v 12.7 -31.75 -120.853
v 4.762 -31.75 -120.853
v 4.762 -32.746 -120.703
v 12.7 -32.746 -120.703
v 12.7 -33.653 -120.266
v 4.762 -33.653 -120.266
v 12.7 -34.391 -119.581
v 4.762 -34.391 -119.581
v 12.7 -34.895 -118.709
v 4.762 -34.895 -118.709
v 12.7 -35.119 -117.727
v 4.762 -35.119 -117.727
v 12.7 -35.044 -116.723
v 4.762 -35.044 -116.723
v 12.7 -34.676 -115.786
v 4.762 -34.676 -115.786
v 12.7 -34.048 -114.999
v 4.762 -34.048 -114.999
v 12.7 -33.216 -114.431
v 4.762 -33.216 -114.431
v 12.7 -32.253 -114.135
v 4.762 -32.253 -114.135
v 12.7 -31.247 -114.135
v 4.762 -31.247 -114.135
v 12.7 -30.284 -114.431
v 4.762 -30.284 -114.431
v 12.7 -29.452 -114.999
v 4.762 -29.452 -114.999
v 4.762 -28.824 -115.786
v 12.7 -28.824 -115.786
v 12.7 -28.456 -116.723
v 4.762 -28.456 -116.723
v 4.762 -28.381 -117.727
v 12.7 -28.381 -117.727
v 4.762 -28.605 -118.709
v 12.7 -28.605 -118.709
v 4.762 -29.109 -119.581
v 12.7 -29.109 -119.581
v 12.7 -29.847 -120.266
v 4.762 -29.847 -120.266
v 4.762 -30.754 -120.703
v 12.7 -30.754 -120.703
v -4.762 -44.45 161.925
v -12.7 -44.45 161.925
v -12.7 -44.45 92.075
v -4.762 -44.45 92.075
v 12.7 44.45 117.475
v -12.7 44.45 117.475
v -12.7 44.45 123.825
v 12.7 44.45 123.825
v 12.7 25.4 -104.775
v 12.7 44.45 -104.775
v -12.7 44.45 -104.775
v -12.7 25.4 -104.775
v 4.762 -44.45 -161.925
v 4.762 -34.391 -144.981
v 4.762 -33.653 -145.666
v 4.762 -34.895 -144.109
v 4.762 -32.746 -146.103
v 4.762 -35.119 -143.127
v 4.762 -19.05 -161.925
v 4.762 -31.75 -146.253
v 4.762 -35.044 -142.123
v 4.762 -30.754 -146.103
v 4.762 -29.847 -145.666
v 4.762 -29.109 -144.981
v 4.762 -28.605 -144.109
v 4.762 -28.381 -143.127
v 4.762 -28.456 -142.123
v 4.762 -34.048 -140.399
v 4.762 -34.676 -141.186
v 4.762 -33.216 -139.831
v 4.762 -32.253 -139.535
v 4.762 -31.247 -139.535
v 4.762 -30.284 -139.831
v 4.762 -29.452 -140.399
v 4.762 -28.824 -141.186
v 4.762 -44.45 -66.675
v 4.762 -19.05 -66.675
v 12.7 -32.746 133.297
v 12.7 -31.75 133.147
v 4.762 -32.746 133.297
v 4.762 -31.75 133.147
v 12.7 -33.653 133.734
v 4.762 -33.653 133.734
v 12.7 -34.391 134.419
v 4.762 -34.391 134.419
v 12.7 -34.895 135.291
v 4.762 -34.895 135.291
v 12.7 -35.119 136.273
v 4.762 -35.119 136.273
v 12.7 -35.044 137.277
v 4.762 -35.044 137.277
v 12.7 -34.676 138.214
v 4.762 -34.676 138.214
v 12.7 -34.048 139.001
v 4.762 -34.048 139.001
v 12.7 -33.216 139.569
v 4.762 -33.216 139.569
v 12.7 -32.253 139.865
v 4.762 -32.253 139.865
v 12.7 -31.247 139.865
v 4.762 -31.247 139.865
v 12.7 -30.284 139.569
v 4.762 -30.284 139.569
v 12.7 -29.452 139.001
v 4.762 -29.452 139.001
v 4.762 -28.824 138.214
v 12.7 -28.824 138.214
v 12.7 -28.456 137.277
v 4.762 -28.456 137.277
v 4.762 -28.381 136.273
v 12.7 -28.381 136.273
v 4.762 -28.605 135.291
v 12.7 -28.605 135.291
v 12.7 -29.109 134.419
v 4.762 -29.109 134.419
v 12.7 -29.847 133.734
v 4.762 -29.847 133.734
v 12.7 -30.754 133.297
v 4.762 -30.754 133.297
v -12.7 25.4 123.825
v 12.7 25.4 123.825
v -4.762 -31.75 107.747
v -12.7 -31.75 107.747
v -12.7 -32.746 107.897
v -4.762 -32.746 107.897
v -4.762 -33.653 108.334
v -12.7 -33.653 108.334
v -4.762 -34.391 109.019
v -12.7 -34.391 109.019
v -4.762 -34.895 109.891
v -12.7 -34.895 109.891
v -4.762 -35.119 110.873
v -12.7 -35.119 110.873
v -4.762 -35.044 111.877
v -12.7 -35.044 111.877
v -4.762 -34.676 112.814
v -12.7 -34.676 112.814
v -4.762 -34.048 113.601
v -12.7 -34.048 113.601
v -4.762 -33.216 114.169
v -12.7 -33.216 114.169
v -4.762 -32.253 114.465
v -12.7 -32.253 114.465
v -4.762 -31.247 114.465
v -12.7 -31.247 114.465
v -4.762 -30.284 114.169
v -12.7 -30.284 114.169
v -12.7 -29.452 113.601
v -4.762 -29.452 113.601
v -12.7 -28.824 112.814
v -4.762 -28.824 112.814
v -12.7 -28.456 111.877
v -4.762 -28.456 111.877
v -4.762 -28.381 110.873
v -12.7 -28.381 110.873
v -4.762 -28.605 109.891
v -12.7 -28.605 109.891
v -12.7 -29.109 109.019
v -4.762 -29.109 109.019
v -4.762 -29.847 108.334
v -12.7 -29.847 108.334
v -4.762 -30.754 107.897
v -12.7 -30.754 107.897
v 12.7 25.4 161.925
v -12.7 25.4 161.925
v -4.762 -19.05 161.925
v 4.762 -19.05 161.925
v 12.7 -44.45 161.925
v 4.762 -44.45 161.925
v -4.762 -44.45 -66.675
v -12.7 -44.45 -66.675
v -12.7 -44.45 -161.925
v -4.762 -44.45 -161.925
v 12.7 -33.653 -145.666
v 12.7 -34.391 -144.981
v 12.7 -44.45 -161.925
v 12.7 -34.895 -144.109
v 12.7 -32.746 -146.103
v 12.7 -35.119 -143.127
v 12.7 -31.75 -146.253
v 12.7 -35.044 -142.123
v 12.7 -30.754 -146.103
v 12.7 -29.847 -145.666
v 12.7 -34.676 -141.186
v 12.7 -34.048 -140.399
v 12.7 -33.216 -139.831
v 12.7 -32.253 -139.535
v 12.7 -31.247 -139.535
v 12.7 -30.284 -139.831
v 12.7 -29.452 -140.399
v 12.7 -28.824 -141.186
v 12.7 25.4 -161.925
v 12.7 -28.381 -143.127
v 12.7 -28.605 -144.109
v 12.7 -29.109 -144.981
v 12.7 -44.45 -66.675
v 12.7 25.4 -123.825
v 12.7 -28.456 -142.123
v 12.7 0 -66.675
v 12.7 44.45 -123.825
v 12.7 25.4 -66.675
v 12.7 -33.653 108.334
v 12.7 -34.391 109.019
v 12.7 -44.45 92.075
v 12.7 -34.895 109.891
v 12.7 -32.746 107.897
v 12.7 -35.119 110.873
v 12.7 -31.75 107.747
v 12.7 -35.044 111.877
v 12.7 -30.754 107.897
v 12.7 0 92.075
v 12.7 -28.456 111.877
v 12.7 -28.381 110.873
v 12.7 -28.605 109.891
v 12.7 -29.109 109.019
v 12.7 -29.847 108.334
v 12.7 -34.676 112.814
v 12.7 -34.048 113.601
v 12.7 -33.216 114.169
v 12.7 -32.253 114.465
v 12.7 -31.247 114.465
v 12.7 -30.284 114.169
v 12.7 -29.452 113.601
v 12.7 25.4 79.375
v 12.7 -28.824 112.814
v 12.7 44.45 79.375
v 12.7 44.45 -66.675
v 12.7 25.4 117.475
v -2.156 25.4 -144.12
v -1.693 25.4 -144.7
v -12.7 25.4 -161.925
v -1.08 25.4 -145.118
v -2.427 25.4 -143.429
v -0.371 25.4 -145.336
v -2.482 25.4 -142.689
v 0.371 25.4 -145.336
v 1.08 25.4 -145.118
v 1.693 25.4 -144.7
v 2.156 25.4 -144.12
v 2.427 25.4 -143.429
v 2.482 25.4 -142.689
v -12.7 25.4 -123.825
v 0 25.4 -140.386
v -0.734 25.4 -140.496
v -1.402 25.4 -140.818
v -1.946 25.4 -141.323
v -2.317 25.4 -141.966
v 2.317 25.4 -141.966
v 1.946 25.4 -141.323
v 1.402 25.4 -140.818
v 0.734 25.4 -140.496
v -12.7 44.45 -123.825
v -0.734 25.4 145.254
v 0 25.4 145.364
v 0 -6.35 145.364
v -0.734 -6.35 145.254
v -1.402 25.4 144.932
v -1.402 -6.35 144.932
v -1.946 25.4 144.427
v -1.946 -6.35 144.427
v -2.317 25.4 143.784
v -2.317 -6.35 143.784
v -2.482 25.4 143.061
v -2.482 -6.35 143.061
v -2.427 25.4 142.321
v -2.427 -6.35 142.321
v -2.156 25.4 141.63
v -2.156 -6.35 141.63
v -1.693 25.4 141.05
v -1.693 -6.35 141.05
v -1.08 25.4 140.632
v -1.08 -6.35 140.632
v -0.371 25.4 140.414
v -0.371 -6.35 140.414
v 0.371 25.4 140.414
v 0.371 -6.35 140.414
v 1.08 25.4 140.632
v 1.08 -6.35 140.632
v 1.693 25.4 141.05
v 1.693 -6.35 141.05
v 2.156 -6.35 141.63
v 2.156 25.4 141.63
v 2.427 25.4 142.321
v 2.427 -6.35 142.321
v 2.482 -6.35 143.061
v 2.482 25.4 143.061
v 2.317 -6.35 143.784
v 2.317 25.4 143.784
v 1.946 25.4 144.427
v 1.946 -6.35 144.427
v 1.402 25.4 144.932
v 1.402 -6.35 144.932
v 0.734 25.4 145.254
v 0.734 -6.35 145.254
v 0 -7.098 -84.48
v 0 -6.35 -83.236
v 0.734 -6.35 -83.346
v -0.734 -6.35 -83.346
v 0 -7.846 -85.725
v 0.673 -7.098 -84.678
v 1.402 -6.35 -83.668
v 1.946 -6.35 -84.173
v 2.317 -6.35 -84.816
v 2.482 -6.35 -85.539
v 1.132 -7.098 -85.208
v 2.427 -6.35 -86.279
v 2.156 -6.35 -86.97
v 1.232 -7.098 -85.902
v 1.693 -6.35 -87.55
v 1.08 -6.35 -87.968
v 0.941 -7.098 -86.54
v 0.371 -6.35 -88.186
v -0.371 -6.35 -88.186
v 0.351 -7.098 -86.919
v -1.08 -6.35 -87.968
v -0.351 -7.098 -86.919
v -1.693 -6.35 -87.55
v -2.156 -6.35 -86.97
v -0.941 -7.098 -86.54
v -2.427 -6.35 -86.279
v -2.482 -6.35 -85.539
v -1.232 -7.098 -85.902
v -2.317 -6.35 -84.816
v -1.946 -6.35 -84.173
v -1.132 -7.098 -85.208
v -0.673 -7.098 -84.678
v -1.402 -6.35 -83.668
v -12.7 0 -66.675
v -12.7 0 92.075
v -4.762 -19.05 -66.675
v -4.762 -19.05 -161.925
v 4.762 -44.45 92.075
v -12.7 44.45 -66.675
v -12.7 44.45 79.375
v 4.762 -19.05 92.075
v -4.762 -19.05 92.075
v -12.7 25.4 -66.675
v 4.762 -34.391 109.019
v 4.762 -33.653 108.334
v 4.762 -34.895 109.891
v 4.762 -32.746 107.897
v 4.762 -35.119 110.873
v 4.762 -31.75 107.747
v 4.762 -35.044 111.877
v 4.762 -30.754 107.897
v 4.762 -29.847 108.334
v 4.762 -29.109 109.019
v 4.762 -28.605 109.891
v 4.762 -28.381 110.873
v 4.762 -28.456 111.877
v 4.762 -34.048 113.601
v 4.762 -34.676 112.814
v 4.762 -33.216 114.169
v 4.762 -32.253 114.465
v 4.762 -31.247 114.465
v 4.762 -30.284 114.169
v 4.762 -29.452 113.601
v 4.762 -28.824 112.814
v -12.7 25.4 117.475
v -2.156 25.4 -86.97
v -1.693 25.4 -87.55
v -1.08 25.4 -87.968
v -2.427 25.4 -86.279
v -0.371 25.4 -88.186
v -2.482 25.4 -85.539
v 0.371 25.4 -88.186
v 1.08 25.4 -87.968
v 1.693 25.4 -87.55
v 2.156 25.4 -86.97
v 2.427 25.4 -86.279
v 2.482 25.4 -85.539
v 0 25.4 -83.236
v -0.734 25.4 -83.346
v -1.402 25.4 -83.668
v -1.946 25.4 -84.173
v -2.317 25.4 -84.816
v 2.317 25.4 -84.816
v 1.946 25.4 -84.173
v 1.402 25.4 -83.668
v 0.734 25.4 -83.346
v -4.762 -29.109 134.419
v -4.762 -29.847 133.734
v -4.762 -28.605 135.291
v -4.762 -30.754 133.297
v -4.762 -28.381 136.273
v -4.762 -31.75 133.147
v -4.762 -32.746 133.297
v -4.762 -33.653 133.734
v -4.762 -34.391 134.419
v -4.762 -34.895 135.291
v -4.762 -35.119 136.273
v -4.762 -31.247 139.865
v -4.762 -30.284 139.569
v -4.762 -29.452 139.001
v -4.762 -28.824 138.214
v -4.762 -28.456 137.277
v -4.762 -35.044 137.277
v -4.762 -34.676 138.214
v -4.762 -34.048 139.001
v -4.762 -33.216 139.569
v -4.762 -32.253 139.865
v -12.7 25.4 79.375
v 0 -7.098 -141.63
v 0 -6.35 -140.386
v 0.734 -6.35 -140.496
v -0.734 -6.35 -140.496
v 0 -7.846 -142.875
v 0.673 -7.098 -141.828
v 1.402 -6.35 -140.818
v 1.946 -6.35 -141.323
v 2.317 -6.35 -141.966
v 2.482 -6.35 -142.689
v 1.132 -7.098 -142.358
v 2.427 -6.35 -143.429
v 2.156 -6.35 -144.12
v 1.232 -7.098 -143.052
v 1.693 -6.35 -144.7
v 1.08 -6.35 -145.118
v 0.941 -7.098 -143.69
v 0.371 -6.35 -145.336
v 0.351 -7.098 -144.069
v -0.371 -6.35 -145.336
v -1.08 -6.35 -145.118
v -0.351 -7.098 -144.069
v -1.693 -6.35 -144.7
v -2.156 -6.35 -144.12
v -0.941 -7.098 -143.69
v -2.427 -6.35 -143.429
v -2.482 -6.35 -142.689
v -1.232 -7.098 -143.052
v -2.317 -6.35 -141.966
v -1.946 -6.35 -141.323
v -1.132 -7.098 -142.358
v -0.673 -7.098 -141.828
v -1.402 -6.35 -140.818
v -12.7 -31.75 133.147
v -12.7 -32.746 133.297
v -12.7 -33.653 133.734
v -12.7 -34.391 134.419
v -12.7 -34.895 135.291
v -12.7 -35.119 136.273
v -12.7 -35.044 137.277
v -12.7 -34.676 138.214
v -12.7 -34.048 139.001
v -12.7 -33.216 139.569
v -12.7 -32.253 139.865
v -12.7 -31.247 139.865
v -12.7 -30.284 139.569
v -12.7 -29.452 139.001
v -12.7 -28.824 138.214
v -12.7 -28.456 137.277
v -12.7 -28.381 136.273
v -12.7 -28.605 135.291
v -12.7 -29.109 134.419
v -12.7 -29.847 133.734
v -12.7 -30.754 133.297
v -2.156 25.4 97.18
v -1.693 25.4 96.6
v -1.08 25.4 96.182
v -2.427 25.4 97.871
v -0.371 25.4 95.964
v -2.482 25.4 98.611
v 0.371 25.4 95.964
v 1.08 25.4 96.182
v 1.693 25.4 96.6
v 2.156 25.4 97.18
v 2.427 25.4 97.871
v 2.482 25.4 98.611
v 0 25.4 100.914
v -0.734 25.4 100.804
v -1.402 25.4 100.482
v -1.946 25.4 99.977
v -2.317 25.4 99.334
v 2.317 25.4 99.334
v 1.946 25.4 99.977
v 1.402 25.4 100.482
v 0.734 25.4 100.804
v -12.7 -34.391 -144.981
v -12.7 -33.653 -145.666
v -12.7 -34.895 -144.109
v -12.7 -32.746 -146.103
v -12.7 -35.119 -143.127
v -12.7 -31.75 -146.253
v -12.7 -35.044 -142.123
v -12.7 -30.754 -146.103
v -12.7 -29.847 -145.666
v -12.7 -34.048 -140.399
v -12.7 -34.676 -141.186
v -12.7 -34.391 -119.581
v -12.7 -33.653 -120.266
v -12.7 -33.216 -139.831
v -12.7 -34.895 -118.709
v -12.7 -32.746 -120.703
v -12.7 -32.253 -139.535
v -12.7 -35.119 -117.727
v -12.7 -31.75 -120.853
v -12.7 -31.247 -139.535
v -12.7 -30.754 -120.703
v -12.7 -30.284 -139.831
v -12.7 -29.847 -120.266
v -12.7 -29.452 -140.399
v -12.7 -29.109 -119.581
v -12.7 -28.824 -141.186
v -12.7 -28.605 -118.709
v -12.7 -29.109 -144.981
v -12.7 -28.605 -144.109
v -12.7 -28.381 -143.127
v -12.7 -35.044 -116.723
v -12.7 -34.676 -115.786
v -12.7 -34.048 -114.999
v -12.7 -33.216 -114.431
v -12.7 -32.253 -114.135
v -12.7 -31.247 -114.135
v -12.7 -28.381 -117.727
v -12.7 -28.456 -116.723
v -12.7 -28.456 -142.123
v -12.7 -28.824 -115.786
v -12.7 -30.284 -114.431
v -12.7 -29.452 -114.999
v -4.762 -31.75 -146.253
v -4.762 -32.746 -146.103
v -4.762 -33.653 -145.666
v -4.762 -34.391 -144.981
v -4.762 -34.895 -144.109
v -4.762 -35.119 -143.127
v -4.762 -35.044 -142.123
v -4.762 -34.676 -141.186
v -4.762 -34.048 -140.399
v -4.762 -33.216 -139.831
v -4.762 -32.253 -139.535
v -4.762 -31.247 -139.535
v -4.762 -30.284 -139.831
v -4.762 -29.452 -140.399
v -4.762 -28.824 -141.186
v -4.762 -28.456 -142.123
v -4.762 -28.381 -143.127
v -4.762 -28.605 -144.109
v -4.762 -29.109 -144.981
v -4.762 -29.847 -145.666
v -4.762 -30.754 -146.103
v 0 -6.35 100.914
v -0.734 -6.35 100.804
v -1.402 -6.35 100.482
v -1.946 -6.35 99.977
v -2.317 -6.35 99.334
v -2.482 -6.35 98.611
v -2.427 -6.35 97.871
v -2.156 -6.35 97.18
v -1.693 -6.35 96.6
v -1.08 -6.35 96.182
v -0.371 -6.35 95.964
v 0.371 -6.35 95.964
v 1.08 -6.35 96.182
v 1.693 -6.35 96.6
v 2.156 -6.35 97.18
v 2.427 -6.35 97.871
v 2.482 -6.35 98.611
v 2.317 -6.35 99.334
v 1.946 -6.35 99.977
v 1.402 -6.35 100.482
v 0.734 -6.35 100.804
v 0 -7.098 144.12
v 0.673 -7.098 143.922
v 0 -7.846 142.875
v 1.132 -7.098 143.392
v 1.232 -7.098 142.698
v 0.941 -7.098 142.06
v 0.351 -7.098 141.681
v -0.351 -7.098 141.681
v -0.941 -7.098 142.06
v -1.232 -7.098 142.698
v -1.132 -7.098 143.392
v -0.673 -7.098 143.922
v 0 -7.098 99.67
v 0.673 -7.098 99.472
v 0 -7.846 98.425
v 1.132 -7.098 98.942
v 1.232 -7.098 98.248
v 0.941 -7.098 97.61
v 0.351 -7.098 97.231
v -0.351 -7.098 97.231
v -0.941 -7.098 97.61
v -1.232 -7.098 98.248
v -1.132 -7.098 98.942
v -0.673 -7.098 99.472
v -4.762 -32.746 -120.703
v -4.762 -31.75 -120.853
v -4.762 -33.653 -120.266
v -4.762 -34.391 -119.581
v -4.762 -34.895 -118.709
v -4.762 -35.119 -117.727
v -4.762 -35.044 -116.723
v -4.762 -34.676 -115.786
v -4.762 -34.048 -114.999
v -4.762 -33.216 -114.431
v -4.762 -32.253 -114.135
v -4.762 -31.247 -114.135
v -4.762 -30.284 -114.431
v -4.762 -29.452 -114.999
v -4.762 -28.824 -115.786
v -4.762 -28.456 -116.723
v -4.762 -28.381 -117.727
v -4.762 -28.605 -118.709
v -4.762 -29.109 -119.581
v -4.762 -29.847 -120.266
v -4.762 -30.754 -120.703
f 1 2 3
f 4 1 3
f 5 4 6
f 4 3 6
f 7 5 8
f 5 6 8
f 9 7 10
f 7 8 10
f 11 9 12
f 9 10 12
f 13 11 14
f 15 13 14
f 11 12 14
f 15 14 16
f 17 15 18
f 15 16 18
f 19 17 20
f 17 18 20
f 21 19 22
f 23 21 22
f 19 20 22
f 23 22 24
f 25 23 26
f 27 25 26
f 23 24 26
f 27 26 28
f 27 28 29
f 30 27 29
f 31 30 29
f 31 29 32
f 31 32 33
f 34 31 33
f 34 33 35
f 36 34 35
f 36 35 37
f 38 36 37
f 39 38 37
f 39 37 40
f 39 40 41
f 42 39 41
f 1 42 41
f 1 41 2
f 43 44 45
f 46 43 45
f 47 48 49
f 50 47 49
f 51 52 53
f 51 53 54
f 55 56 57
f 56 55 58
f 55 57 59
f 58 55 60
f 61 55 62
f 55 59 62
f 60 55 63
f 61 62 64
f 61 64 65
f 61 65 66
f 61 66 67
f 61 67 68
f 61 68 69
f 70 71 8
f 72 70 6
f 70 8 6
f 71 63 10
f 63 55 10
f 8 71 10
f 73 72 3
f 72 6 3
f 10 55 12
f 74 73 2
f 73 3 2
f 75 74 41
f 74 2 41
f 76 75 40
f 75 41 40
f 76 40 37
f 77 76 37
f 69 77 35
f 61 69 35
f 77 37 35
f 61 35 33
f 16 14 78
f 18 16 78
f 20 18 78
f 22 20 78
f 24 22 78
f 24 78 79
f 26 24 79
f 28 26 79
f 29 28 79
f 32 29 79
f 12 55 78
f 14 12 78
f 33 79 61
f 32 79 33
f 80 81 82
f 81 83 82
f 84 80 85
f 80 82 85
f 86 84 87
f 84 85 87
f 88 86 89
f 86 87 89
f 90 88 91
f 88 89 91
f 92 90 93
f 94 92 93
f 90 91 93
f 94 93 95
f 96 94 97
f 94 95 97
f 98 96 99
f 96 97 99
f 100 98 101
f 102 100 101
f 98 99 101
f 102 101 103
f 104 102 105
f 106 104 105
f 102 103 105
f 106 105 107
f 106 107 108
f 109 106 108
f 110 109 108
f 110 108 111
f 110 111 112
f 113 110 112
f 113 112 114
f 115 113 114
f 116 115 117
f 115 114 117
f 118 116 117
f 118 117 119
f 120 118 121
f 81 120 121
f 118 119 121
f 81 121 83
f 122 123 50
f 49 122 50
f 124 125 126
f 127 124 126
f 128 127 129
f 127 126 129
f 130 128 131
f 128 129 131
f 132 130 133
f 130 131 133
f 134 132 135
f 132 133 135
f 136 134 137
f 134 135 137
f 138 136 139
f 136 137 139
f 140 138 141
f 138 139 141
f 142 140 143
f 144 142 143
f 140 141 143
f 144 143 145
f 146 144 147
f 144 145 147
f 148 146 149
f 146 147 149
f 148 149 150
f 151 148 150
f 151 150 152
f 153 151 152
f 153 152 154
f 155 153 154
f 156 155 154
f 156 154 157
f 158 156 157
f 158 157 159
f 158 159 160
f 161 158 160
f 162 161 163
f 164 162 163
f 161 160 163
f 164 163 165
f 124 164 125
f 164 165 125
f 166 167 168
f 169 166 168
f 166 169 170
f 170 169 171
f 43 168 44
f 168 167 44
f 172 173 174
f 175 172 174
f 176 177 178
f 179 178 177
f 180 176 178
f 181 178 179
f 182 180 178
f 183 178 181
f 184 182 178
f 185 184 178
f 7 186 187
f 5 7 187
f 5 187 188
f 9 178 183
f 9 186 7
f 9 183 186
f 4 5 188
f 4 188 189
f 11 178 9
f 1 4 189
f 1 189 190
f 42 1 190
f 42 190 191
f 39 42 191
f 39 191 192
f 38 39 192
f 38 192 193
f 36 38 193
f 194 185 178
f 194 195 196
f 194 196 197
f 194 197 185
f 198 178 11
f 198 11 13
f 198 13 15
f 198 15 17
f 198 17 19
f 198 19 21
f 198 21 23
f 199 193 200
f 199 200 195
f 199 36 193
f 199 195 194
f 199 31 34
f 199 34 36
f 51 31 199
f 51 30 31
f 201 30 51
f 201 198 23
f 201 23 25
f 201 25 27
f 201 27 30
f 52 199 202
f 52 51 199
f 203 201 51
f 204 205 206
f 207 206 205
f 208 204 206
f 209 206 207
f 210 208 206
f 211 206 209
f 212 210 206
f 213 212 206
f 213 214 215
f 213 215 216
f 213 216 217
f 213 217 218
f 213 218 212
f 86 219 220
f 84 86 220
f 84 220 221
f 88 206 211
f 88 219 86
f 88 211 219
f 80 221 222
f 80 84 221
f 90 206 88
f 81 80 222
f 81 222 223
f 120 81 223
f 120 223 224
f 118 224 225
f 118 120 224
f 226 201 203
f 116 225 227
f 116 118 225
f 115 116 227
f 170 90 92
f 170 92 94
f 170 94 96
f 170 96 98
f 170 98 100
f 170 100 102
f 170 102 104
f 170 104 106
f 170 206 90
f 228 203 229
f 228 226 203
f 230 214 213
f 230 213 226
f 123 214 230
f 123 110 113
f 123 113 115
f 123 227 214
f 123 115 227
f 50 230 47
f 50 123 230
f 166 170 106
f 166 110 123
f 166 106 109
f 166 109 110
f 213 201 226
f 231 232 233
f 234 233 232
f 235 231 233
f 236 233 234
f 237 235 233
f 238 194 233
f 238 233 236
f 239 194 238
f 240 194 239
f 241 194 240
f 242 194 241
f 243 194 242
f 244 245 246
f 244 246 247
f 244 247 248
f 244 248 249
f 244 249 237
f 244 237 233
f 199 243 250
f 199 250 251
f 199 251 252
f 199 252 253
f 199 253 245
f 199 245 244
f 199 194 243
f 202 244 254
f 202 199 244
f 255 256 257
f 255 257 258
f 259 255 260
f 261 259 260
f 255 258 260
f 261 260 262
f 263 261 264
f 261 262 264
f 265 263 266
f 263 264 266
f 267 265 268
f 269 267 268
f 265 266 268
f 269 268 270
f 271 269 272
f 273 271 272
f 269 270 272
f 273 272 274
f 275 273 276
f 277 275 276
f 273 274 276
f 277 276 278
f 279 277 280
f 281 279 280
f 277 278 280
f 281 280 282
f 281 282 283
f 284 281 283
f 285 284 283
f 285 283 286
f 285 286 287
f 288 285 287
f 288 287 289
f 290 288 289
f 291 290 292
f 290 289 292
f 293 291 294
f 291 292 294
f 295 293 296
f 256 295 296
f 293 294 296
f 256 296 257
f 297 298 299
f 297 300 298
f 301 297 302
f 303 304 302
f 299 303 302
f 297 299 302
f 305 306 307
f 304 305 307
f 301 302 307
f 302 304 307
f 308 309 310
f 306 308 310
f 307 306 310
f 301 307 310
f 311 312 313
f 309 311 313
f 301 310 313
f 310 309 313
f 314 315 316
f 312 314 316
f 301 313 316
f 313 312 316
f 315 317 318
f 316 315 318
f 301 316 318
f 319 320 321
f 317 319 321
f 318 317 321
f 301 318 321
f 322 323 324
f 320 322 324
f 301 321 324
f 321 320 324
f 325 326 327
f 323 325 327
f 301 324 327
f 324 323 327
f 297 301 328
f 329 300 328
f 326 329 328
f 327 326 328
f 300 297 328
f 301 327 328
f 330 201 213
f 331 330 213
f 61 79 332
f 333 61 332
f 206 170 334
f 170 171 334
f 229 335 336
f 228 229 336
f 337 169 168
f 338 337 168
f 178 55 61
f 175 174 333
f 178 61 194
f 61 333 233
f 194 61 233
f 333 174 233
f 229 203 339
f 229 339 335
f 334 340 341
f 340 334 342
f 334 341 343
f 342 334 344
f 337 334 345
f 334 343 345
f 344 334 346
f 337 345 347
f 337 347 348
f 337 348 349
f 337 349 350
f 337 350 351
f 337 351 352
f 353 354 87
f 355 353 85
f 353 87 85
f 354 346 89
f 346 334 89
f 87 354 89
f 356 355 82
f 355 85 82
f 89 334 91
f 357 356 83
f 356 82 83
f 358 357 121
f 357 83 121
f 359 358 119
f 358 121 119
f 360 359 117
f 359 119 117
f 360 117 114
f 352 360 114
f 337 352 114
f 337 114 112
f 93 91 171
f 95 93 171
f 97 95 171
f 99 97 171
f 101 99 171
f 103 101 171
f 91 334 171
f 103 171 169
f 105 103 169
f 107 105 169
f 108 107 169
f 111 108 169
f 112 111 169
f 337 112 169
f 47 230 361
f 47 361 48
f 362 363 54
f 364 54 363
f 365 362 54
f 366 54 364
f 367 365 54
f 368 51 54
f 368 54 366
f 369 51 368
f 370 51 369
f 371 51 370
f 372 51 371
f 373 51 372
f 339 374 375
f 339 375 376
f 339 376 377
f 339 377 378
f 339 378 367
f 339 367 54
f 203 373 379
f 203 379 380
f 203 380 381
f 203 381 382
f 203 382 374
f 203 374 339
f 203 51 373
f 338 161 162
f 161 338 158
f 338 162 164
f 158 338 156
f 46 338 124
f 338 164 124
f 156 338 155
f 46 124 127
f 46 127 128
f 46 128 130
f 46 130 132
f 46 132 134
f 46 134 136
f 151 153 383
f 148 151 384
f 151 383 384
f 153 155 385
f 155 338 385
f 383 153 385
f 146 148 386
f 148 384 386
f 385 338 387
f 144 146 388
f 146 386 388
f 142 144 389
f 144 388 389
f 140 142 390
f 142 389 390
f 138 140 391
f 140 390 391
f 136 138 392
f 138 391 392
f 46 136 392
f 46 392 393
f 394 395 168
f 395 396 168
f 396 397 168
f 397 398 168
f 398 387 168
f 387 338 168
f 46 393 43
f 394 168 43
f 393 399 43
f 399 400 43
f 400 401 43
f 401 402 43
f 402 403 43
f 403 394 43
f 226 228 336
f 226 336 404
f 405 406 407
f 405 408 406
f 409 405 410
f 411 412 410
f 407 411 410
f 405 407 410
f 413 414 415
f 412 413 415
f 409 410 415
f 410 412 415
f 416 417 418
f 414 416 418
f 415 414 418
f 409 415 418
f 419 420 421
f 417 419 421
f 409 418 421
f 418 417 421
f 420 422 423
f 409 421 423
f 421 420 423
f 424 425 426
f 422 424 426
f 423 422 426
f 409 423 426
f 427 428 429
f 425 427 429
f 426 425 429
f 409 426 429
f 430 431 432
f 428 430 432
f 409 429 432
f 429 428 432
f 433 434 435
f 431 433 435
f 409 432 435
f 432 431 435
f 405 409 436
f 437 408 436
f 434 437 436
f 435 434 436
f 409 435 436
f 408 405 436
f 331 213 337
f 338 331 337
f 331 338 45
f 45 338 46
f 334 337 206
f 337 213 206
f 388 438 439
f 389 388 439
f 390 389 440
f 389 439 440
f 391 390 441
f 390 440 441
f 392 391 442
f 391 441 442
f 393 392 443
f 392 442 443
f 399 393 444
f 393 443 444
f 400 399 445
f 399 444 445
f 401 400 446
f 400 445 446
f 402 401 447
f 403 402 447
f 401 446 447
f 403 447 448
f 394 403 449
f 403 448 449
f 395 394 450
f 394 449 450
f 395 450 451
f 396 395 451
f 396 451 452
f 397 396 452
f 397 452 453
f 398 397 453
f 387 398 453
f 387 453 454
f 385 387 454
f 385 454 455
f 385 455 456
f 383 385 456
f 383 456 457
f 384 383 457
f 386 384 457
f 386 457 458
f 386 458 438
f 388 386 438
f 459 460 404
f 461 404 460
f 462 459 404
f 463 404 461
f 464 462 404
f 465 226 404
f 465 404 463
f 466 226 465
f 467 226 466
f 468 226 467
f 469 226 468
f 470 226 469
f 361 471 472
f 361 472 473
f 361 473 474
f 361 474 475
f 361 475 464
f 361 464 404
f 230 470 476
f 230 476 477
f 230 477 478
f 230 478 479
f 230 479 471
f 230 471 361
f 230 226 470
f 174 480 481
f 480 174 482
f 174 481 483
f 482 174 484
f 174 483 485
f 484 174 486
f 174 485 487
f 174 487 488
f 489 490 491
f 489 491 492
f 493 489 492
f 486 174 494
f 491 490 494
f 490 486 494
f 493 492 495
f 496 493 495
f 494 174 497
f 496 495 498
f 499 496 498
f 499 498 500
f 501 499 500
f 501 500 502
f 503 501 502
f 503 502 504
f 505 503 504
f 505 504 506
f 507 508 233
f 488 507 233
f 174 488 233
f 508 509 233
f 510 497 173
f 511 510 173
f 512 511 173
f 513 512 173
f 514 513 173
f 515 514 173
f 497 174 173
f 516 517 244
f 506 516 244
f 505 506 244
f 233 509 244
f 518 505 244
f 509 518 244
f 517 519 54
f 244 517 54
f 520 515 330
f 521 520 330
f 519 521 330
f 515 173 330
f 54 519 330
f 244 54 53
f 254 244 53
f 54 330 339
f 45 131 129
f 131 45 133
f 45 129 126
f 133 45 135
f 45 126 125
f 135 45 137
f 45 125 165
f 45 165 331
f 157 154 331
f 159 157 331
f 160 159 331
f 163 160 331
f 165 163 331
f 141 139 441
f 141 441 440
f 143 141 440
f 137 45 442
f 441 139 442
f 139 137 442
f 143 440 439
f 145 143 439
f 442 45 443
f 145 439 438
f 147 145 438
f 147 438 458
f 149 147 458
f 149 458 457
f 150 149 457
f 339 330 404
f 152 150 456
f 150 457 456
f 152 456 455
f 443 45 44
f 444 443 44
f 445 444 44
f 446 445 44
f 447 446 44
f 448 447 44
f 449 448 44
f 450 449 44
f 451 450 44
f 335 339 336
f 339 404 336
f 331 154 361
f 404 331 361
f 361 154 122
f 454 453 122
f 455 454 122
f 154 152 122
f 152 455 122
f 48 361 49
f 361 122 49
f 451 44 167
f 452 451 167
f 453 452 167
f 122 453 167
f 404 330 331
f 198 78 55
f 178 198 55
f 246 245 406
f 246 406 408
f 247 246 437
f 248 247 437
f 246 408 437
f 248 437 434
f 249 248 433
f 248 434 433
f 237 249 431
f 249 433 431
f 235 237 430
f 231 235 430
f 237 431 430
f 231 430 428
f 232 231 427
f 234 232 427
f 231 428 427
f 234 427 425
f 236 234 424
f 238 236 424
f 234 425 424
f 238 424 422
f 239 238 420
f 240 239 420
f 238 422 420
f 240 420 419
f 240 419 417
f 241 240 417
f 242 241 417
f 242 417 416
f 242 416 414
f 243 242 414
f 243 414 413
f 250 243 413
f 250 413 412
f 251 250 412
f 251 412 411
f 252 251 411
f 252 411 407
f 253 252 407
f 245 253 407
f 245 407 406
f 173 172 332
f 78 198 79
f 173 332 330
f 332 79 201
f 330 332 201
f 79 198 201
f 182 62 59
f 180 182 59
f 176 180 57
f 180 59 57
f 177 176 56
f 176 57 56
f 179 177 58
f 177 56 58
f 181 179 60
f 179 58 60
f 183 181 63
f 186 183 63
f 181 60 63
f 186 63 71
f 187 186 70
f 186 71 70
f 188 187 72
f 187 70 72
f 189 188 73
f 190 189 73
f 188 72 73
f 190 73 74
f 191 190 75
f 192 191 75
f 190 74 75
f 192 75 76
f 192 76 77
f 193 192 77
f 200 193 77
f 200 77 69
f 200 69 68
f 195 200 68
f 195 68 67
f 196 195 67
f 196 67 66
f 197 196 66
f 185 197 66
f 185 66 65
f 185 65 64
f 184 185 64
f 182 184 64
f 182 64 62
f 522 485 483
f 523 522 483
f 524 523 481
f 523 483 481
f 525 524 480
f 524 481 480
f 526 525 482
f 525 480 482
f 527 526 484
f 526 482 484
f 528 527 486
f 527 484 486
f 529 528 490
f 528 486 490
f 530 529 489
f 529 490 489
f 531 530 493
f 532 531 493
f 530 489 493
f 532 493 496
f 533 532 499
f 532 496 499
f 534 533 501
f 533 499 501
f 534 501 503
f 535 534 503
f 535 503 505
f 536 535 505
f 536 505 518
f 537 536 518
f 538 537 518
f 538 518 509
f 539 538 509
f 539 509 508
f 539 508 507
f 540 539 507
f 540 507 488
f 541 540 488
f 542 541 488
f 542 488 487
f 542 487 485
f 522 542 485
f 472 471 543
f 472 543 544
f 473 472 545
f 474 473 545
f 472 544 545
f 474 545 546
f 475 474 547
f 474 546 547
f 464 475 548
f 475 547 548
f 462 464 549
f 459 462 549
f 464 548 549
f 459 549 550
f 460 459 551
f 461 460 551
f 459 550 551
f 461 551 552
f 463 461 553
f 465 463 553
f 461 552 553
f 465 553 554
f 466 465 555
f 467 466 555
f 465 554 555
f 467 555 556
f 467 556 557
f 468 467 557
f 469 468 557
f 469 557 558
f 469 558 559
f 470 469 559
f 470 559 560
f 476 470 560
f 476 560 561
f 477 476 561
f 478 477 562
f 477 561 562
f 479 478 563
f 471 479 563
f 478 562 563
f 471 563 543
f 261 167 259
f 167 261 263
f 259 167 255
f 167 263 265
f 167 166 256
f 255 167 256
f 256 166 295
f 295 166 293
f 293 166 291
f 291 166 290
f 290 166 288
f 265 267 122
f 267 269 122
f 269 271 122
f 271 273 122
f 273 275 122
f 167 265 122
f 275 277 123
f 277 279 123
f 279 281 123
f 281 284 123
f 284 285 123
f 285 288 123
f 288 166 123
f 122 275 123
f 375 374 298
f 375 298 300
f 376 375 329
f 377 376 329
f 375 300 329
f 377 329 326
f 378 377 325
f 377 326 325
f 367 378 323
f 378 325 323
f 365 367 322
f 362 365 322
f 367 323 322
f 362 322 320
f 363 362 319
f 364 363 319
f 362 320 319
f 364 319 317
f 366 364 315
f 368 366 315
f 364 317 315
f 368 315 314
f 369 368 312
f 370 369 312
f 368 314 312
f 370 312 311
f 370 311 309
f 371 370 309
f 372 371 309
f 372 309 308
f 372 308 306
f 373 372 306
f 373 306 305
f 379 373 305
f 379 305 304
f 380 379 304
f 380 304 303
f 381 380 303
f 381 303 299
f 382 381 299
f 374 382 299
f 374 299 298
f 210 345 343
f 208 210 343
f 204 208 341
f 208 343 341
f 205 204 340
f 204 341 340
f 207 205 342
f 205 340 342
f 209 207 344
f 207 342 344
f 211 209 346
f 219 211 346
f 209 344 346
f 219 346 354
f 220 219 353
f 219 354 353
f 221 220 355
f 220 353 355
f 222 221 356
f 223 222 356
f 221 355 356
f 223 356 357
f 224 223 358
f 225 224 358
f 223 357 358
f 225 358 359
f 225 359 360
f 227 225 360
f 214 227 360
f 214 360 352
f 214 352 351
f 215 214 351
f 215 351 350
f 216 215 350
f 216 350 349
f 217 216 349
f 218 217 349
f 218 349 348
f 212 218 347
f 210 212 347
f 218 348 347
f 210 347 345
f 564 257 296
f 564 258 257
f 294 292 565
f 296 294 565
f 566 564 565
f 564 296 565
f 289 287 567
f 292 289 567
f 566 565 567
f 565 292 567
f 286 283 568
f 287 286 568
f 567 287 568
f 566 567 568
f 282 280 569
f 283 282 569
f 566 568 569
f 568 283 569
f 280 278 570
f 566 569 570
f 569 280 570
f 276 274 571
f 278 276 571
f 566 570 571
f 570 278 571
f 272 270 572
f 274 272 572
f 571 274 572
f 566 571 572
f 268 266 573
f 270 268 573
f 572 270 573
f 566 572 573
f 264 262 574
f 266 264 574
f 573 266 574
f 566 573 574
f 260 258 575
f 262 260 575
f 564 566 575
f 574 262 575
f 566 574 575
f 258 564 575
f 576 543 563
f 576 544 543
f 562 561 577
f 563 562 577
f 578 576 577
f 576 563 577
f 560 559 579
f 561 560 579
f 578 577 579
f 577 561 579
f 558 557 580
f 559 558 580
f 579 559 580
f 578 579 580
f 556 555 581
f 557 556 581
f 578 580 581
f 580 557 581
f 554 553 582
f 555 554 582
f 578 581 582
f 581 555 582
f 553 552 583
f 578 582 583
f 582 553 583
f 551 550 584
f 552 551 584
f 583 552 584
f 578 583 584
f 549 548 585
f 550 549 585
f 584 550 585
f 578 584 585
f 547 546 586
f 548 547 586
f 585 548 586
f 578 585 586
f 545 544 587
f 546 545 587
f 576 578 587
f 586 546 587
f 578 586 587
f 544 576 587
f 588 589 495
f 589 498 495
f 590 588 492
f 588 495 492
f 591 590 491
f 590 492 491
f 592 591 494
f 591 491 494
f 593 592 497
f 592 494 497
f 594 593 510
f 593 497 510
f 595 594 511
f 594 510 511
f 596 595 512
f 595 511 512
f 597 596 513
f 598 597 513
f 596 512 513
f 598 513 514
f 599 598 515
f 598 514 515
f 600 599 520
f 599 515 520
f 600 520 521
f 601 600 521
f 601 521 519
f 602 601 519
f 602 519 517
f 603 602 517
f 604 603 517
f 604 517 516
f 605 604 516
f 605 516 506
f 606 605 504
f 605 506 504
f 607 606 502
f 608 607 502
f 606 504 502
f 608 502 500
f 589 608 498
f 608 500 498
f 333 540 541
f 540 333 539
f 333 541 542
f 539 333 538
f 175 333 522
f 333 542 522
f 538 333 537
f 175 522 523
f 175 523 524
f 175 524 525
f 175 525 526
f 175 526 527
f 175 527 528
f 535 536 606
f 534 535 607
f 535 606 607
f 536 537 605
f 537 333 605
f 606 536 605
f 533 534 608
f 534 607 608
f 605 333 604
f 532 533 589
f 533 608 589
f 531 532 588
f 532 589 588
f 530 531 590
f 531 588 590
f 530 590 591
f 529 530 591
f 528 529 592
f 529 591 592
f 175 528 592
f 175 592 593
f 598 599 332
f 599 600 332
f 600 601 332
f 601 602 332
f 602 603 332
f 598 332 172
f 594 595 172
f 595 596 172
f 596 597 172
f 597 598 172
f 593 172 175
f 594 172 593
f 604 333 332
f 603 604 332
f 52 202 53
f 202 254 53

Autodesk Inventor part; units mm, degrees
ref_plane "YZ Plane" through (0, 0, 0) normal (1, 0, 0) x (0, 1, 0)
ref_plane "XZ Plane" through (0, 0, 0) normal (0, 1, 0) x (-1, 0, 0)
ref_plane "XY Plane" through (0, 0, 0) normal (0, 0, 1) x (1, 0, 0)
sketch "Sketch1" plane through (0, 0, 0) normal (1, 0, 0) x (0, 1, 0)
  line L0 (-44.45, 161.925) -> (-44.45, -161.925)
  line L1 (-44.45, -161.925) -> (44.45, -161.925)
  line L2 (44.45, -161.925) -> (44.45, 161.925)
  line L3 (44.45, 161.925) -> (-44.45, 161.925)
  line L4 (-44.45, 161.925) -> (44.45, -161.925) construction
  line L5 (-44.45, -161.925) -> (44.45, 161.925) construction
  point P0 (0, 0)
  dimension "d0" = 323.85
  dimension "d1" = 88.9
extrude "Extrusion1" add sketch "Sketch1" along normal mid plane 25.4
sketch "Sketch2" plane through (12.7, 0, 0) normal (1, 0, 0) x (0, 0, -1)
  line L0 (-161.925, -44.45) -> (161.925, -44.45) projected
  line L1 (-92.075, -44.45) -> (66.675, -44.45)
  line L2 (66.675, -44.45) -> (66.675, 0)
  line L3 (66.675, 0) -> (-92.075, 0)
  line L4 (-92.075, 0) -> (-92.075, -44.45)
  line L5 (-161.925, 44.45) -> (-161.925, -44.45) projected
  point P0 (0, 0)
  dimension "d4" = 158.75
  dimension "d5" = 44.45
  dimension "d6" = 69.85
extrude "Extrusion2" cut sketch "Sketch2" against normal through all
sketch "Sketch4" plane through (-12.7, -44.45, 161.925) normal (0, 0, 1) x (1, 0, 0)
  line L0 (7.9375, 0) -> (17.4625, 0)
  line L1 (17.4625, 0) -> (17.4625, 25.4)
  line L2 (17.4625, 25.4) -> (7.9375, 25.4)
  line L3 (7.9375, 25.4) -> (7.9375, 0)
  line L4 (25.4, 0) -> (0, 0) projected
  point P0 (12.7, 44.45)
  dimension "d11" = 4.7625
  dimension "d12" = 4.7625
  dimension "d13" = 25.4
extrude "Extrusion3" cut sketch "Sketch4" against normal through all
sketch "Sketch6" plane through (12.7, 0, 0) normal (1, 0, 0) x (0, 0, -1)
  point P0 (0, 0)
sketch "Sketch7" plane through (12.7, 0, 0) normal (1, 0, 0) x (0, 0, -1)
  line L0 (-161.925, 44.45) -> (-161.925, -44.45) projected
  line L1 (-161.925, -44.45) -> (-161.925, 44.45) construction
  line L2 (-161.925, -31.75) -> (161.925, -31.75) construction
  line L3 (161.925, 44.45) -> (161.925, -44.45) construction
  point P0 (0, 0)
  point P1 (-136.525, -31.75)
  point P2 (-111.125, -31.75)
  point P3 (117.475, -31.75)
  point P4 (142.875, -31.75)
  dimension "d16" = 12.7
  dimension "d17" = 25.4
  dimension "d18" = 25.4
  dimension "d19" = 279.4
  dimension "d20" = 25.4
hole "Hole1" at (12.7, -31.75, 136.525) at (12.7, -31.75, 111.125) at (12.7, -31.75, -117.475) at (12.7, -31.75, -142.875) direction (-1, 0, 0) diameter 6.7564 end through all clearance for "Flat Head Machine Screw (82)" size "1/4" standard "Ansi Unified Screw Threads"
sketch "Sketch8" plane through (12.7, 0, 0) normal (1, 0, 0) x (0, 0, -1)
  line L0 (-161.925, 44.45) -> (-161.925, -44.45) projected
  line L1 (-161.925, 25.4) -> (-123.825, 25.4)
  line L2 (-123.825, 25.4) -> (-123.825, 44.45)
  line L3 (-123.825, 44.45) -> (-161.925, 44.45)
  line L4 (-161.925, 44.45) -> (-161.925, 25.4)
  line L5 (161.925, 44.45) -> (-161.925, 44.45) projected
  line L6 (161.925, 44.45) -> (161.925, -44.45) projected
  line L7 (161.925, 25.4) -> (123.825, 25.4)
  line L8 (123.825, 25.4) -> (123.825, 44.45)
  line L9 (123.825, 44.45) -> (161.925, 44.45)
  line L10 (161.925, 44.45) -> (161.925, 25.4)
  line L11 (-117.475, 44.45) -> (-79.375, 44.45)
  line L12 (-79.375, 44.45) -> (-79.375, 25.4)
  line L13 (-79.375, 25.4) -> (-117.475, 25.4)
  line L14 (-117.475, 25.4) -> (-117.475, 44.45)
  line L15 (104.775, 25.4) -> (66.675, 25.4)
  line L16 (66.675, 25.4) -> (66.675, 44.45)
  line L17 (66.675, 44.45) -> (104.775, 44.45)
  line L18 (104.775, 44.45) -> (104.775, 25.4)
  point P0 (0, 0)
  dimension "d28" = 38.1
  dimension "d29" = 19.05
  dimension "d30" = 6.35
  dimension "d31" = 146.05
extrude "Extrusion4" cut sketch "Sketch8" against normal through all
sketch "Sketch9" plane through (12.7, 25.4, 161.925) normal (0, 1, 0) x (1, 0, 0)
  line L0 (-17.4625, 0) -> (-7.9375, 0) construction
  line L1 (-12.7, 0) -> (-12.7, 323.226) construction
  line L2 (0, 0) -> (-25.4, 0) construction
  line L3 (0, 44.45) -> (-25.4, 44.45) construction
  line L4 (0, 228.6) -> (-25.4, 228.6) construction
  line L5 (0, 285.75) -> (-25.4, 285.75) construction
  point P0 (-12.7, 161.925)
  point P1 (-12.7, 19.05)
  point P2 (-12.7, 63.5)
  point P3 (-12.7, 247.65)
  point P4 (-12.7, 304.8)
  dimension "d34" = 19.05
  dimension "d35" = 19.05
  dimension "d36" = 19.05
  dimension "d37" = 19.05
hole "Hole2" at (0, 25.4, 142.875) at (0, 25.4, 98.425) at (0, 25.4, -85.725) at (0, 25.4, -142.875) direction (0, -1, 0) diameter 4.9784 depth 31.75 tip angle 118 thread size "1/4-20 UNC" class "2B" standard "ANSI Unified Screw Threads"
equation "\"d0\" = RailSlideTotalLength"
equation "\"d1\" = RailSlideTotalHeight"
equation "\"d2\" = RailSlideTotalWidth"
equation "\"d4\" = WidthOfCutoutForTransmission"
equation "\"d5\" = heigthOfCutoutForTransmission"
equation "\"d6\" = distanceFromRearToStartOfTransmissionCutout"
equation "\"d7\" = RailSlideTotalWidth"
equation "\"d11\" = 0.5 * cutoutWidth"
equation "\"d12\" = 0.5 * cutoutWidth"
equation "\"d13\" = cutoutHeight"
equation "\"d14\" = RailSlideTotalWidth"
equation "\"d32\" = RailSlideTotalWidth"
equation "\"RailSlideTotalLength\" = 323.85"
equation "\"RailSlideTotalWidth\" = 25.4"
equation "\"RailSlideTotalHeight\" = 88.9"
equation "\"WidthOfCutoutForTransmission\" = 158.75"
equation "\"heigthOfCutoutForTransmission\" = 44.45"
equation "\"distanceFromRearToStartOfTransmissionCutout\" = 69.85"
equation "\"cutoutWidth\" = 9.525"
equation "\"cutoutHeight\" = 25.4"
properties part number "RailSlideLeftSide"
